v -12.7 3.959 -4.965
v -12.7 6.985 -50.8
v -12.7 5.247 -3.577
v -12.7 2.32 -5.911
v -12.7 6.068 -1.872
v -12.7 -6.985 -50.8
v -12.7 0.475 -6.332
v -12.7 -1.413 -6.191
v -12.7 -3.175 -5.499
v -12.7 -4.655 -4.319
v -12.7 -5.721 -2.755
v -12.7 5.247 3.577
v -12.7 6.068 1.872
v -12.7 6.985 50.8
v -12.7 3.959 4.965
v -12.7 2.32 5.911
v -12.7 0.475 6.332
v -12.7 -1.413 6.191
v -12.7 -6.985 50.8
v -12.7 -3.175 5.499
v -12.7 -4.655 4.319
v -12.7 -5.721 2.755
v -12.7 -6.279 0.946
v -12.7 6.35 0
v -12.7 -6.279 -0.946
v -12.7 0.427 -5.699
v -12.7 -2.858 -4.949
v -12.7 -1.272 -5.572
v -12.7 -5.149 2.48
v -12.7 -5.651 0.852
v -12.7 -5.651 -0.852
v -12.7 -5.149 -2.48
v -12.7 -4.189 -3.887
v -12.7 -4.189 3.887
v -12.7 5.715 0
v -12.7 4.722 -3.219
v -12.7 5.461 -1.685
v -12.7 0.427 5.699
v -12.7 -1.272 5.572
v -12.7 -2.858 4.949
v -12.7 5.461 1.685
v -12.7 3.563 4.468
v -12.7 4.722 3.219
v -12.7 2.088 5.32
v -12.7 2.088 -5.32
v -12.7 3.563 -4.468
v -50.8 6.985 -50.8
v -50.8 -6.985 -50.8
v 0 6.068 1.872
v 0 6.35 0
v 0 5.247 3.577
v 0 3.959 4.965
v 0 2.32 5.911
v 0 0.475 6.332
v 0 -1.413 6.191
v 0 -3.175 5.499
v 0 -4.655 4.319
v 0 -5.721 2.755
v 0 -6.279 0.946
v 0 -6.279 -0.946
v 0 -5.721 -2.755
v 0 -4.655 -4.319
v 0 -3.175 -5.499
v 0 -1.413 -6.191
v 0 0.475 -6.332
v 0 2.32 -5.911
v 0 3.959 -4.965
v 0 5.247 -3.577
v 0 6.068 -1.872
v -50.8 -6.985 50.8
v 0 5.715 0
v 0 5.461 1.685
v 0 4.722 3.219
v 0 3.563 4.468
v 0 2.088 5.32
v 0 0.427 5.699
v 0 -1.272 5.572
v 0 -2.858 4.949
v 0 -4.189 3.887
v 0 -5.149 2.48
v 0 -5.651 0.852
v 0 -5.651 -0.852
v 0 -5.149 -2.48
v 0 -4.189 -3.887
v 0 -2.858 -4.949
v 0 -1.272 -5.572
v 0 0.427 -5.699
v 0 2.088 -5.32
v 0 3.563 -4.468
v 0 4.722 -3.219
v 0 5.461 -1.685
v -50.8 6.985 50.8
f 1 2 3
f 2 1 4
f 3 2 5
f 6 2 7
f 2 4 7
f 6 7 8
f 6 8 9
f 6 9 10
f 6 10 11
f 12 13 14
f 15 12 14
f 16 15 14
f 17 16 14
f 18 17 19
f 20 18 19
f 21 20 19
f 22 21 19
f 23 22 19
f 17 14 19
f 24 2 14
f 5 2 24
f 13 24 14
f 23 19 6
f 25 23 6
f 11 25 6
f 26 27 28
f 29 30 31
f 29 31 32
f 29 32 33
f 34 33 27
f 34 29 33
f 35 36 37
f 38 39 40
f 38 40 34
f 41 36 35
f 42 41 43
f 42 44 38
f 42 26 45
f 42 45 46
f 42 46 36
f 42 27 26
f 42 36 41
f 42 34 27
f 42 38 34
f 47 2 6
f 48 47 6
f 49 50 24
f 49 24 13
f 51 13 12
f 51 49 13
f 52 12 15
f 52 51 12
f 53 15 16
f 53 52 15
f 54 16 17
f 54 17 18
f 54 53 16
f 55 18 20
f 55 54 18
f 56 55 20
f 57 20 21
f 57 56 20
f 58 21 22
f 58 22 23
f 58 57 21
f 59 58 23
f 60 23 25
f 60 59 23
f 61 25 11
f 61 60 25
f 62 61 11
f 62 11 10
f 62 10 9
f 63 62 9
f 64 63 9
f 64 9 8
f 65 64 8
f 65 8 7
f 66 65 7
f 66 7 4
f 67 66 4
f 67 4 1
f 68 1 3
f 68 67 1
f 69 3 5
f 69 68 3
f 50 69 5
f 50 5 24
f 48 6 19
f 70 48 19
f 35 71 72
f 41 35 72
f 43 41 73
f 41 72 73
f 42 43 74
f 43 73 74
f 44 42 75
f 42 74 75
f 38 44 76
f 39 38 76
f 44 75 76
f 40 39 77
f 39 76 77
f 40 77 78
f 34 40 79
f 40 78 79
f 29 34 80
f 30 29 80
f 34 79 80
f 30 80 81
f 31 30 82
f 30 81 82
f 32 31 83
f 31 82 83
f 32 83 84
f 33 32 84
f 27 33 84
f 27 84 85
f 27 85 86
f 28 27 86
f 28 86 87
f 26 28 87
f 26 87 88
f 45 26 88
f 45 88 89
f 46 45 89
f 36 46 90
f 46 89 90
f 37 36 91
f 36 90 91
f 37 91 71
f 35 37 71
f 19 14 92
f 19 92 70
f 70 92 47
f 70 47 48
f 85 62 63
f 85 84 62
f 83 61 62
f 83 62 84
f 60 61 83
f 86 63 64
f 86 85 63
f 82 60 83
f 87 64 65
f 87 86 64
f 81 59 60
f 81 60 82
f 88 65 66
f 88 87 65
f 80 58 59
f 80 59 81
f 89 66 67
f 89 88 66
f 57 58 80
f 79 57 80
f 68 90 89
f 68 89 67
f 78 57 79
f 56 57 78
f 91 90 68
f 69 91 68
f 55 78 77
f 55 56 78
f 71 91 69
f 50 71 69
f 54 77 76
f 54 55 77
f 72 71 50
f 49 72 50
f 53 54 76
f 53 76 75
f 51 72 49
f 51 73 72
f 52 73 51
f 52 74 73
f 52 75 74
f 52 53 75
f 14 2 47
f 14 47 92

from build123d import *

# Parameters (mm, degrees)
F0_R     = 6.35
F1_DEPTH = 12.7
F2_W     = 13.97
F2_H     = 101.6
F3_DEPTH = 38.1
F4_R     = 5.715
F5_DEPTH = 12.7


with BuildPart() as f1:
    # F0 (on Right) → F1 (new body)
    with BuildSketch(Plane.YZ):
        Circle(F0_R)
    extrude(amount=-F1_DEPTH)

    # F2 (on face) → F3 (join)
    with BuildSketch(Plane(origin=(-12.7, 0, 0), x_dir=(0, -1, 0), z_dir=(-1, 0, 0))):
        Rectangle(F2_W, F2_H)
    extrude(amount=F3_DEPTH)

    # F4 (on face) → F5 (cut)
    with BuildSketch(Plane.YZ):
        Circle(F4_R)
    extrude(amount=-F5_DEPTH, mode=Mode.SUBTRACT)


solid = f1.part
